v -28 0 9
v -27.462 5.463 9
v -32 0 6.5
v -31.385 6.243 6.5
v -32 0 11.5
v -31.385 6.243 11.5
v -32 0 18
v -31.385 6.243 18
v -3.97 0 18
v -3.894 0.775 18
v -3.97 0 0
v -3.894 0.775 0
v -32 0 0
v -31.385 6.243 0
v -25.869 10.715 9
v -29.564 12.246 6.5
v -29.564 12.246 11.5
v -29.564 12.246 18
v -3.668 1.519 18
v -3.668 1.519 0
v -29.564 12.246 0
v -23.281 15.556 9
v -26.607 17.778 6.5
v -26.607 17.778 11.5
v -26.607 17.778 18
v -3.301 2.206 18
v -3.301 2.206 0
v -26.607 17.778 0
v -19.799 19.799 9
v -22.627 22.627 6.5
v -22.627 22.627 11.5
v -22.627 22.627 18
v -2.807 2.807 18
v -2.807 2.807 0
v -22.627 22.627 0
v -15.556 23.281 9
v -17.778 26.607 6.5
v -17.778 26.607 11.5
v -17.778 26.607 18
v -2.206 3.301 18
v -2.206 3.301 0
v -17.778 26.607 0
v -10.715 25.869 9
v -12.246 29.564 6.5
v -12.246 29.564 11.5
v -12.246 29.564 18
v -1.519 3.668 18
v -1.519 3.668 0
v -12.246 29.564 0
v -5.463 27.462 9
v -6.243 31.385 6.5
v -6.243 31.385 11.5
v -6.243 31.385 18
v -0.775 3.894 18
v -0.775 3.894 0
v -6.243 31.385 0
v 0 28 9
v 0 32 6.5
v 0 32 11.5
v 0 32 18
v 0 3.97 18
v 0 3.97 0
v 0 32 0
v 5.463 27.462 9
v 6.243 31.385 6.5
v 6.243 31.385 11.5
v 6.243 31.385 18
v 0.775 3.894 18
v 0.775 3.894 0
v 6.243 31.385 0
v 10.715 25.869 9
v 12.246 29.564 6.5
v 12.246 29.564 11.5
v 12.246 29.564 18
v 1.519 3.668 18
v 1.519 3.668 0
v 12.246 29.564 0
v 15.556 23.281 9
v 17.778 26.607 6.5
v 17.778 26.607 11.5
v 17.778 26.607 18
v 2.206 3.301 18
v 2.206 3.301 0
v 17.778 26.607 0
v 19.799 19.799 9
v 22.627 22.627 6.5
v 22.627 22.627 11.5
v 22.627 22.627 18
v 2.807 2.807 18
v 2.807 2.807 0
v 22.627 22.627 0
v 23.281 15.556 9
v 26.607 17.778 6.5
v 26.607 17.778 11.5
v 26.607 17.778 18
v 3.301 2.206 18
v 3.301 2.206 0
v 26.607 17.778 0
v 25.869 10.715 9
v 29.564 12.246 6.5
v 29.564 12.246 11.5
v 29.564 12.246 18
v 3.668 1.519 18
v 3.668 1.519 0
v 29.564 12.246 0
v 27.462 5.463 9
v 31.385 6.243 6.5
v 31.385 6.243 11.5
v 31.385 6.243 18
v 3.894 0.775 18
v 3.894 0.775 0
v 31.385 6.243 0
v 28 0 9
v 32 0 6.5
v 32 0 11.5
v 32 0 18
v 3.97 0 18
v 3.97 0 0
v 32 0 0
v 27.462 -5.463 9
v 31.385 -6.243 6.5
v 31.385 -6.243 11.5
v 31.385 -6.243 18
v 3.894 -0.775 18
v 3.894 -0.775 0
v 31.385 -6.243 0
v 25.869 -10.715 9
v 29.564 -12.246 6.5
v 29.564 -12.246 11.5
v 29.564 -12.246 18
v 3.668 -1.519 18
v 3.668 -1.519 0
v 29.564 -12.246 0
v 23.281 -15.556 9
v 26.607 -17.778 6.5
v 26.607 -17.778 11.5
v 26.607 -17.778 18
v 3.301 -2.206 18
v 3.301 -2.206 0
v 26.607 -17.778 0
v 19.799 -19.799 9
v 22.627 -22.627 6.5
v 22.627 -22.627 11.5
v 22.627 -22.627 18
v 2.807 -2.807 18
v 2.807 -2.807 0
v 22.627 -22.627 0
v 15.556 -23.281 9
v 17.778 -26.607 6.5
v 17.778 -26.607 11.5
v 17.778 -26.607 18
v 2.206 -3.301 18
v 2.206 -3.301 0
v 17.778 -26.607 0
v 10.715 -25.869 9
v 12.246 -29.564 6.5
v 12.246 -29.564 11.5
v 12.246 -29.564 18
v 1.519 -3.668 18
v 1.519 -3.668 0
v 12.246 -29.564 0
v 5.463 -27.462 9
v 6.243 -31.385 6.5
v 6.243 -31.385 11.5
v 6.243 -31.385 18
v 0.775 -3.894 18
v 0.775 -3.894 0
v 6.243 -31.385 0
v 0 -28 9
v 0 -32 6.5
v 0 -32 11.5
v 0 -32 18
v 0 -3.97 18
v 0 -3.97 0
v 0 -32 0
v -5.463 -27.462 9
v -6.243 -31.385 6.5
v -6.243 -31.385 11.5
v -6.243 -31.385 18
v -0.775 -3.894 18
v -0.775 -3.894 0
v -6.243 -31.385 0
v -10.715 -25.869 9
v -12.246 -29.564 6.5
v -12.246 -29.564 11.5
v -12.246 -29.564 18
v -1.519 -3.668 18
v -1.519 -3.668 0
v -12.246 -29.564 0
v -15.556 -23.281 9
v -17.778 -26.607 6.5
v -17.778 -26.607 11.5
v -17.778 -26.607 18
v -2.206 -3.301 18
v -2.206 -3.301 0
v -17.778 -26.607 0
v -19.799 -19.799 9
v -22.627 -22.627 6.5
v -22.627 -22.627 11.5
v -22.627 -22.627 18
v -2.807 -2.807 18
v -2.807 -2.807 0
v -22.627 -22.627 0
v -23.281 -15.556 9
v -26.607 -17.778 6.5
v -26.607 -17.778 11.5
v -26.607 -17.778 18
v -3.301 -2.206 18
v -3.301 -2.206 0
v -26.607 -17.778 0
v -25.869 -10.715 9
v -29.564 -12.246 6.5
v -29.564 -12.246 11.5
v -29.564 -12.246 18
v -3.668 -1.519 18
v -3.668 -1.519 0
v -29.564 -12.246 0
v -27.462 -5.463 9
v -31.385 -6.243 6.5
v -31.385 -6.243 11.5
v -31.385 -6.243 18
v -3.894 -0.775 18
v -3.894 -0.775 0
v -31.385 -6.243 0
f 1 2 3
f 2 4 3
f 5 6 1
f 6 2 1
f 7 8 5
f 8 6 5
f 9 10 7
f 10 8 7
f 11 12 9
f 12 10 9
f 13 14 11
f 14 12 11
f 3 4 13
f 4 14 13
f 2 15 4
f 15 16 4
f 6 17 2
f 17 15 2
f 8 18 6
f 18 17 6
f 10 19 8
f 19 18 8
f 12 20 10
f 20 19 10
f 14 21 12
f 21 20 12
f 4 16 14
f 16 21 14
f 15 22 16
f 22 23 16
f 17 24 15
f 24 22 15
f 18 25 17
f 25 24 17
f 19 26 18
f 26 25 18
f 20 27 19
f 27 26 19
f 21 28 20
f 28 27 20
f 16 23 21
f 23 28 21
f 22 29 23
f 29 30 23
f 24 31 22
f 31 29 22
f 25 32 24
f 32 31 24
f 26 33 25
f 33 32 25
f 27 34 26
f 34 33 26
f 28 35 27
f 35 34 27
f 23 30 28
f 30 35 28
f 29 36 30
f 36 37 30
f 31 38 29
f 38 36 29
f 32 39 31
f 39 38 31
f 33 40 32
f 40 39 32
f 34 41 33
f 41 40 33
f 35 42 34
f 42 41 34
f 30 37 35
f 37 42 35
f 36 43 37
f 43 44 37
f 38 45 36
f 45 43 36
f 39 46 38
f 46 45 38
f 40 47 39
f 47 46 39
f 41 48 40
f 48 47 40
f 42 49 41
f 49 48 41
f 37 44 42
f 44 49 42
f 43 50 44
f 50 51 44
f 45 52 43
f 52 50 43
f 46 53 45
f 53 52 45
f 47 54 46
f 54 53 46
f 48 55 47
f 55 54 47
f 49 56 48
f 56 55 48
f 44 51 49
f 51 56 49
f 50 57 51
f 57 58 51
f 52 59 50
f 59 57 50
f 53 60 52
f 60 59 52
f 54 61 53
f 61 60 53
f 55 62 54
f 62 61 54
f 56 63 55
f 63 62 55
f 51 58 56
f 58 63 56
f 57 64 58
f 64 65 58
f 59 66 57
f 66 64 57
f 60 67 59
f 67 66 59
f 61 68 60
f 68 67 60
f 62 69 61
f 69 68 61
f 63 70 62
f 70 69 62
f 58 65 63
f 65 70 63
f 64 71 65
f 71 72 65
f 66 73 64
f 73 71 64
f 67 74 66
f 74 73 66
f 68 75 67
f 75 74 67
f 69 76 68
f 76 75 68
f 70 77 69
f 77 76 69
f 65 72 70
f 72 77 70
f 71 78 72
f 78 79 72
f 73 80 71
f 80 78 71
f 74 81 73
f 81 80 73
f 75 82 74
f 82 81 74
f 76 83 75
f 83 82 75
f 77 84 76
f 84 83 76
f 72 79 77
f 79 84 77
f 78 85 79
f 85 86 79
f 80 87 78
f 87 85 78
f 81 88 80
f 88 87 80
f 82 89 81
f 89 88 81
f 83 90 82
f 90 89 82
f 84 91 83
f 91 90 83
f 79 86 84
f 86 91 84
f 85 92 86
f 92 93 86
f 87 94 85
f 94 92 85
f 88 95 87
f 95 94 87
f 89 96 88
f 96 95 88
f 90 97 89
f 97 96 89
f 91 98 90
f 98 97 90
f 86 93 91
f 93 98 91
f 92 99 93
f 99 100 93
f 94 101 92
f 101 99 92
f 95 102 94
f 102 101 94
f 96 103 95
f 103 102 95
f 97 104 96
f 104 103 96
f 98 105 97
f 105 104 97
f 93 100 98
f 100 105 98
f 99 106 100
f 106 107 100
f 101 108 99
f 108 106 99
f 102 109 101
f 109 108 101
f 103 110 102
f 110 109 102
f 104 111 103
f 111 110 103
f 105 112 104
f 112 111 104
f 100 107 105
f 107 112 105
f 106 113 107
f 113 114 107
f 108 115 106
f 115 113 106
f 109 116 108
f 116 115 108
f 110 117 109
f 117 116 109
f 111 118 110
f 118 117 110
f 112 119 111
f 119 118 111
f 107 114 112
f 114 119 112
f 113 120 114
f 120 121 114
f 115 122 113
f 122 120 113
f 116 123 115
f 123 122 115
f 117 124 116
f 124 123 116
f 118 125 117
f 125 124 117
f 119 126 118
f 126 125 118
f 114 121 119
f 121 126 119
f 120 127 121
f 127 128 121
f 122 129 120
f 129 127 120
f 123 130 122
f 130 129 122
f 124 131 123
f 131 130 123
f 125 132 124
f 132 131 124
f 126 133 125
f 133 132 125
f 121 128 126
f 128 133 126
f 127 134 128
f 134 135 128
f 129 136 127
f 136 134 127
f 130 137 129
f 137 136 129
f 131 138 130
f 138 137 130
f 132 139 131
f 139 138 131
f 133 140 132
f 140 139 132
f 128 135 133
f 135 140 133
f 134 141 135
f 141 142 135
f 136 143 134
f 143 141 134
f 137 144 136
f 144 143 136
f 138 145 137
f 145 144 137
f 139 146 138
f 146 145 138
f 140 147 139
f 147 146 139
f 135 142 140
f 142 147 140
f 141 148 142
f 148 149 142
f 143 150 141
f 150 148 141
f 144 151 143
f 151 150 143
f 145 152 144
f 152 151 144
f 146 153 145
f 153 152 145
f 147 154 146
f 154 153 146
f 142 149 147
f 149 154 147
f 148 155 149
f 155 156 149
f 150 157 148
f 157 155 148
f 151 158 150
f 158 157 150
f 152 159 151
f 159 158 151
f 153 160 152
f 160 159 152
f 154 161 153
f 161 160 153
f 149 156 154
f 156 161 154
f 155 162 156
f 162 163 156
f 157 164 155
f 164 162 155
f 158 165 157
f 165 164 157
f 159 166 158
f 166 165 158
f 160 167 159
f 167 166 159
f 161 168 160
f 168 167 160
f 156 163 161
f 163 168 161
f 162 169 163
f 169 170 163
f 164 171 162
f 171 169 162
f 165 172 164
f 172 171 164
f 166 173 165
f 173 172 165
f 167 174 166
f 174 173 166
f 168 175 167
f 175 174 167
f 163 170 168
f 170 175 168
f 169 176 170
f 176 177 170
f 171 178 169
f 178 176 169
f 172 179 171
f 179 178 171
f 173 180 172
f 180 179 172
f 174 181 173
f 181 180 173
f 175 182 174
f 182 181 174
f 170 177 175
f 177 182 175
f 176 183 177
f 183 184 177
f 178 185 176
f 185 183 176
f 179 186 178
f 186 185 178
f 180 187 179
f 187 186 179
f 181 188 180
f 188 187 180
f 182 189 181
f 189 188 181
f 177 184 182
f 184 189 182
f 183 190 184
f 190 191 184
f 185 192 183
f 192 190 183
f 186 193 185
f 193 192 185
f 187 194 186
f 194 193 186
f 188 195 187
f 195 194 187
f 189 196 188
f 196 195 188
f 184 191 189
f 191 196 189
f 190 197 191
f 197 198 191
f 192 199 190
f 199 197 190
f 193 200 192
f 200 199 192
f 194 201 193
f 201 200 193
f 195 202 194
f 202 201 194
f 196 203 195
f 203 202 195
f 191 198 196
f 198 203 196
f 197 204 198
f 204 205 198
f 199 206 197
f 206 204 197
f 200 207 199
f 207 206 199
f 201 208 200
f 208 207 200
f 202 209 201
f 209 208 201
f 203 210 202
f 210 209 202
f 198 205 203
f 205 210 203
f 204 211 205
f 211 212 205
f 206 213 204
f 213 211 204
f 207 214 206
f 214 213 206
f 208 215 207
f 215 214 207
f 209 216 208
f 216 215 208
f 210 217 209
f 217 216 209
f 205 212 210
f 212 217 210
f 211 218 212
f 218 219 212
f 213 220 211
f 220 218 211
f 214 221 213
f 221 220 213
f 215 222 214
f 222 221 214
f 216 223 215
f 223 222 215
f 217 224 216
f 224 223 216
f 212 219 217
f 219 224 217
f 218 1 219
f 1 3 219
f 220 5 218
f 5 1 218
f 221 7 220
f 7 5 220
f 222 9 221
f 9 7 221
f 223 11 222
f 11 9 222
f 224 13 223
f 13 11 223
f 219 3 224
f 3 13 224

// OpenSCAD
$fn = 32;

// ----------------------------------------------------------------------
// Belt roller: 64 mm barrel, 18 mm wide, bore 7.94 mm
// ----------------------------------------------------------------------

// --- parameters (mm) ---
bore_d = 7.94;            // bore
barrel_d = 64;            // barrel diameter
roller_w = 18;            // roller width
groove_w = 5;             // guide groove width
groove_d = 4;             // guide groove depth

roller_profile = [[3.97, 0], [32, 0], [32, 6.5], [28, 9], [32, 11.5], [32, 18], [3.97, 18]];

/* the profile stays clear of the axis, so the bore comes out of the revolve */
rotate_extrude() polygon(roller_profile);
